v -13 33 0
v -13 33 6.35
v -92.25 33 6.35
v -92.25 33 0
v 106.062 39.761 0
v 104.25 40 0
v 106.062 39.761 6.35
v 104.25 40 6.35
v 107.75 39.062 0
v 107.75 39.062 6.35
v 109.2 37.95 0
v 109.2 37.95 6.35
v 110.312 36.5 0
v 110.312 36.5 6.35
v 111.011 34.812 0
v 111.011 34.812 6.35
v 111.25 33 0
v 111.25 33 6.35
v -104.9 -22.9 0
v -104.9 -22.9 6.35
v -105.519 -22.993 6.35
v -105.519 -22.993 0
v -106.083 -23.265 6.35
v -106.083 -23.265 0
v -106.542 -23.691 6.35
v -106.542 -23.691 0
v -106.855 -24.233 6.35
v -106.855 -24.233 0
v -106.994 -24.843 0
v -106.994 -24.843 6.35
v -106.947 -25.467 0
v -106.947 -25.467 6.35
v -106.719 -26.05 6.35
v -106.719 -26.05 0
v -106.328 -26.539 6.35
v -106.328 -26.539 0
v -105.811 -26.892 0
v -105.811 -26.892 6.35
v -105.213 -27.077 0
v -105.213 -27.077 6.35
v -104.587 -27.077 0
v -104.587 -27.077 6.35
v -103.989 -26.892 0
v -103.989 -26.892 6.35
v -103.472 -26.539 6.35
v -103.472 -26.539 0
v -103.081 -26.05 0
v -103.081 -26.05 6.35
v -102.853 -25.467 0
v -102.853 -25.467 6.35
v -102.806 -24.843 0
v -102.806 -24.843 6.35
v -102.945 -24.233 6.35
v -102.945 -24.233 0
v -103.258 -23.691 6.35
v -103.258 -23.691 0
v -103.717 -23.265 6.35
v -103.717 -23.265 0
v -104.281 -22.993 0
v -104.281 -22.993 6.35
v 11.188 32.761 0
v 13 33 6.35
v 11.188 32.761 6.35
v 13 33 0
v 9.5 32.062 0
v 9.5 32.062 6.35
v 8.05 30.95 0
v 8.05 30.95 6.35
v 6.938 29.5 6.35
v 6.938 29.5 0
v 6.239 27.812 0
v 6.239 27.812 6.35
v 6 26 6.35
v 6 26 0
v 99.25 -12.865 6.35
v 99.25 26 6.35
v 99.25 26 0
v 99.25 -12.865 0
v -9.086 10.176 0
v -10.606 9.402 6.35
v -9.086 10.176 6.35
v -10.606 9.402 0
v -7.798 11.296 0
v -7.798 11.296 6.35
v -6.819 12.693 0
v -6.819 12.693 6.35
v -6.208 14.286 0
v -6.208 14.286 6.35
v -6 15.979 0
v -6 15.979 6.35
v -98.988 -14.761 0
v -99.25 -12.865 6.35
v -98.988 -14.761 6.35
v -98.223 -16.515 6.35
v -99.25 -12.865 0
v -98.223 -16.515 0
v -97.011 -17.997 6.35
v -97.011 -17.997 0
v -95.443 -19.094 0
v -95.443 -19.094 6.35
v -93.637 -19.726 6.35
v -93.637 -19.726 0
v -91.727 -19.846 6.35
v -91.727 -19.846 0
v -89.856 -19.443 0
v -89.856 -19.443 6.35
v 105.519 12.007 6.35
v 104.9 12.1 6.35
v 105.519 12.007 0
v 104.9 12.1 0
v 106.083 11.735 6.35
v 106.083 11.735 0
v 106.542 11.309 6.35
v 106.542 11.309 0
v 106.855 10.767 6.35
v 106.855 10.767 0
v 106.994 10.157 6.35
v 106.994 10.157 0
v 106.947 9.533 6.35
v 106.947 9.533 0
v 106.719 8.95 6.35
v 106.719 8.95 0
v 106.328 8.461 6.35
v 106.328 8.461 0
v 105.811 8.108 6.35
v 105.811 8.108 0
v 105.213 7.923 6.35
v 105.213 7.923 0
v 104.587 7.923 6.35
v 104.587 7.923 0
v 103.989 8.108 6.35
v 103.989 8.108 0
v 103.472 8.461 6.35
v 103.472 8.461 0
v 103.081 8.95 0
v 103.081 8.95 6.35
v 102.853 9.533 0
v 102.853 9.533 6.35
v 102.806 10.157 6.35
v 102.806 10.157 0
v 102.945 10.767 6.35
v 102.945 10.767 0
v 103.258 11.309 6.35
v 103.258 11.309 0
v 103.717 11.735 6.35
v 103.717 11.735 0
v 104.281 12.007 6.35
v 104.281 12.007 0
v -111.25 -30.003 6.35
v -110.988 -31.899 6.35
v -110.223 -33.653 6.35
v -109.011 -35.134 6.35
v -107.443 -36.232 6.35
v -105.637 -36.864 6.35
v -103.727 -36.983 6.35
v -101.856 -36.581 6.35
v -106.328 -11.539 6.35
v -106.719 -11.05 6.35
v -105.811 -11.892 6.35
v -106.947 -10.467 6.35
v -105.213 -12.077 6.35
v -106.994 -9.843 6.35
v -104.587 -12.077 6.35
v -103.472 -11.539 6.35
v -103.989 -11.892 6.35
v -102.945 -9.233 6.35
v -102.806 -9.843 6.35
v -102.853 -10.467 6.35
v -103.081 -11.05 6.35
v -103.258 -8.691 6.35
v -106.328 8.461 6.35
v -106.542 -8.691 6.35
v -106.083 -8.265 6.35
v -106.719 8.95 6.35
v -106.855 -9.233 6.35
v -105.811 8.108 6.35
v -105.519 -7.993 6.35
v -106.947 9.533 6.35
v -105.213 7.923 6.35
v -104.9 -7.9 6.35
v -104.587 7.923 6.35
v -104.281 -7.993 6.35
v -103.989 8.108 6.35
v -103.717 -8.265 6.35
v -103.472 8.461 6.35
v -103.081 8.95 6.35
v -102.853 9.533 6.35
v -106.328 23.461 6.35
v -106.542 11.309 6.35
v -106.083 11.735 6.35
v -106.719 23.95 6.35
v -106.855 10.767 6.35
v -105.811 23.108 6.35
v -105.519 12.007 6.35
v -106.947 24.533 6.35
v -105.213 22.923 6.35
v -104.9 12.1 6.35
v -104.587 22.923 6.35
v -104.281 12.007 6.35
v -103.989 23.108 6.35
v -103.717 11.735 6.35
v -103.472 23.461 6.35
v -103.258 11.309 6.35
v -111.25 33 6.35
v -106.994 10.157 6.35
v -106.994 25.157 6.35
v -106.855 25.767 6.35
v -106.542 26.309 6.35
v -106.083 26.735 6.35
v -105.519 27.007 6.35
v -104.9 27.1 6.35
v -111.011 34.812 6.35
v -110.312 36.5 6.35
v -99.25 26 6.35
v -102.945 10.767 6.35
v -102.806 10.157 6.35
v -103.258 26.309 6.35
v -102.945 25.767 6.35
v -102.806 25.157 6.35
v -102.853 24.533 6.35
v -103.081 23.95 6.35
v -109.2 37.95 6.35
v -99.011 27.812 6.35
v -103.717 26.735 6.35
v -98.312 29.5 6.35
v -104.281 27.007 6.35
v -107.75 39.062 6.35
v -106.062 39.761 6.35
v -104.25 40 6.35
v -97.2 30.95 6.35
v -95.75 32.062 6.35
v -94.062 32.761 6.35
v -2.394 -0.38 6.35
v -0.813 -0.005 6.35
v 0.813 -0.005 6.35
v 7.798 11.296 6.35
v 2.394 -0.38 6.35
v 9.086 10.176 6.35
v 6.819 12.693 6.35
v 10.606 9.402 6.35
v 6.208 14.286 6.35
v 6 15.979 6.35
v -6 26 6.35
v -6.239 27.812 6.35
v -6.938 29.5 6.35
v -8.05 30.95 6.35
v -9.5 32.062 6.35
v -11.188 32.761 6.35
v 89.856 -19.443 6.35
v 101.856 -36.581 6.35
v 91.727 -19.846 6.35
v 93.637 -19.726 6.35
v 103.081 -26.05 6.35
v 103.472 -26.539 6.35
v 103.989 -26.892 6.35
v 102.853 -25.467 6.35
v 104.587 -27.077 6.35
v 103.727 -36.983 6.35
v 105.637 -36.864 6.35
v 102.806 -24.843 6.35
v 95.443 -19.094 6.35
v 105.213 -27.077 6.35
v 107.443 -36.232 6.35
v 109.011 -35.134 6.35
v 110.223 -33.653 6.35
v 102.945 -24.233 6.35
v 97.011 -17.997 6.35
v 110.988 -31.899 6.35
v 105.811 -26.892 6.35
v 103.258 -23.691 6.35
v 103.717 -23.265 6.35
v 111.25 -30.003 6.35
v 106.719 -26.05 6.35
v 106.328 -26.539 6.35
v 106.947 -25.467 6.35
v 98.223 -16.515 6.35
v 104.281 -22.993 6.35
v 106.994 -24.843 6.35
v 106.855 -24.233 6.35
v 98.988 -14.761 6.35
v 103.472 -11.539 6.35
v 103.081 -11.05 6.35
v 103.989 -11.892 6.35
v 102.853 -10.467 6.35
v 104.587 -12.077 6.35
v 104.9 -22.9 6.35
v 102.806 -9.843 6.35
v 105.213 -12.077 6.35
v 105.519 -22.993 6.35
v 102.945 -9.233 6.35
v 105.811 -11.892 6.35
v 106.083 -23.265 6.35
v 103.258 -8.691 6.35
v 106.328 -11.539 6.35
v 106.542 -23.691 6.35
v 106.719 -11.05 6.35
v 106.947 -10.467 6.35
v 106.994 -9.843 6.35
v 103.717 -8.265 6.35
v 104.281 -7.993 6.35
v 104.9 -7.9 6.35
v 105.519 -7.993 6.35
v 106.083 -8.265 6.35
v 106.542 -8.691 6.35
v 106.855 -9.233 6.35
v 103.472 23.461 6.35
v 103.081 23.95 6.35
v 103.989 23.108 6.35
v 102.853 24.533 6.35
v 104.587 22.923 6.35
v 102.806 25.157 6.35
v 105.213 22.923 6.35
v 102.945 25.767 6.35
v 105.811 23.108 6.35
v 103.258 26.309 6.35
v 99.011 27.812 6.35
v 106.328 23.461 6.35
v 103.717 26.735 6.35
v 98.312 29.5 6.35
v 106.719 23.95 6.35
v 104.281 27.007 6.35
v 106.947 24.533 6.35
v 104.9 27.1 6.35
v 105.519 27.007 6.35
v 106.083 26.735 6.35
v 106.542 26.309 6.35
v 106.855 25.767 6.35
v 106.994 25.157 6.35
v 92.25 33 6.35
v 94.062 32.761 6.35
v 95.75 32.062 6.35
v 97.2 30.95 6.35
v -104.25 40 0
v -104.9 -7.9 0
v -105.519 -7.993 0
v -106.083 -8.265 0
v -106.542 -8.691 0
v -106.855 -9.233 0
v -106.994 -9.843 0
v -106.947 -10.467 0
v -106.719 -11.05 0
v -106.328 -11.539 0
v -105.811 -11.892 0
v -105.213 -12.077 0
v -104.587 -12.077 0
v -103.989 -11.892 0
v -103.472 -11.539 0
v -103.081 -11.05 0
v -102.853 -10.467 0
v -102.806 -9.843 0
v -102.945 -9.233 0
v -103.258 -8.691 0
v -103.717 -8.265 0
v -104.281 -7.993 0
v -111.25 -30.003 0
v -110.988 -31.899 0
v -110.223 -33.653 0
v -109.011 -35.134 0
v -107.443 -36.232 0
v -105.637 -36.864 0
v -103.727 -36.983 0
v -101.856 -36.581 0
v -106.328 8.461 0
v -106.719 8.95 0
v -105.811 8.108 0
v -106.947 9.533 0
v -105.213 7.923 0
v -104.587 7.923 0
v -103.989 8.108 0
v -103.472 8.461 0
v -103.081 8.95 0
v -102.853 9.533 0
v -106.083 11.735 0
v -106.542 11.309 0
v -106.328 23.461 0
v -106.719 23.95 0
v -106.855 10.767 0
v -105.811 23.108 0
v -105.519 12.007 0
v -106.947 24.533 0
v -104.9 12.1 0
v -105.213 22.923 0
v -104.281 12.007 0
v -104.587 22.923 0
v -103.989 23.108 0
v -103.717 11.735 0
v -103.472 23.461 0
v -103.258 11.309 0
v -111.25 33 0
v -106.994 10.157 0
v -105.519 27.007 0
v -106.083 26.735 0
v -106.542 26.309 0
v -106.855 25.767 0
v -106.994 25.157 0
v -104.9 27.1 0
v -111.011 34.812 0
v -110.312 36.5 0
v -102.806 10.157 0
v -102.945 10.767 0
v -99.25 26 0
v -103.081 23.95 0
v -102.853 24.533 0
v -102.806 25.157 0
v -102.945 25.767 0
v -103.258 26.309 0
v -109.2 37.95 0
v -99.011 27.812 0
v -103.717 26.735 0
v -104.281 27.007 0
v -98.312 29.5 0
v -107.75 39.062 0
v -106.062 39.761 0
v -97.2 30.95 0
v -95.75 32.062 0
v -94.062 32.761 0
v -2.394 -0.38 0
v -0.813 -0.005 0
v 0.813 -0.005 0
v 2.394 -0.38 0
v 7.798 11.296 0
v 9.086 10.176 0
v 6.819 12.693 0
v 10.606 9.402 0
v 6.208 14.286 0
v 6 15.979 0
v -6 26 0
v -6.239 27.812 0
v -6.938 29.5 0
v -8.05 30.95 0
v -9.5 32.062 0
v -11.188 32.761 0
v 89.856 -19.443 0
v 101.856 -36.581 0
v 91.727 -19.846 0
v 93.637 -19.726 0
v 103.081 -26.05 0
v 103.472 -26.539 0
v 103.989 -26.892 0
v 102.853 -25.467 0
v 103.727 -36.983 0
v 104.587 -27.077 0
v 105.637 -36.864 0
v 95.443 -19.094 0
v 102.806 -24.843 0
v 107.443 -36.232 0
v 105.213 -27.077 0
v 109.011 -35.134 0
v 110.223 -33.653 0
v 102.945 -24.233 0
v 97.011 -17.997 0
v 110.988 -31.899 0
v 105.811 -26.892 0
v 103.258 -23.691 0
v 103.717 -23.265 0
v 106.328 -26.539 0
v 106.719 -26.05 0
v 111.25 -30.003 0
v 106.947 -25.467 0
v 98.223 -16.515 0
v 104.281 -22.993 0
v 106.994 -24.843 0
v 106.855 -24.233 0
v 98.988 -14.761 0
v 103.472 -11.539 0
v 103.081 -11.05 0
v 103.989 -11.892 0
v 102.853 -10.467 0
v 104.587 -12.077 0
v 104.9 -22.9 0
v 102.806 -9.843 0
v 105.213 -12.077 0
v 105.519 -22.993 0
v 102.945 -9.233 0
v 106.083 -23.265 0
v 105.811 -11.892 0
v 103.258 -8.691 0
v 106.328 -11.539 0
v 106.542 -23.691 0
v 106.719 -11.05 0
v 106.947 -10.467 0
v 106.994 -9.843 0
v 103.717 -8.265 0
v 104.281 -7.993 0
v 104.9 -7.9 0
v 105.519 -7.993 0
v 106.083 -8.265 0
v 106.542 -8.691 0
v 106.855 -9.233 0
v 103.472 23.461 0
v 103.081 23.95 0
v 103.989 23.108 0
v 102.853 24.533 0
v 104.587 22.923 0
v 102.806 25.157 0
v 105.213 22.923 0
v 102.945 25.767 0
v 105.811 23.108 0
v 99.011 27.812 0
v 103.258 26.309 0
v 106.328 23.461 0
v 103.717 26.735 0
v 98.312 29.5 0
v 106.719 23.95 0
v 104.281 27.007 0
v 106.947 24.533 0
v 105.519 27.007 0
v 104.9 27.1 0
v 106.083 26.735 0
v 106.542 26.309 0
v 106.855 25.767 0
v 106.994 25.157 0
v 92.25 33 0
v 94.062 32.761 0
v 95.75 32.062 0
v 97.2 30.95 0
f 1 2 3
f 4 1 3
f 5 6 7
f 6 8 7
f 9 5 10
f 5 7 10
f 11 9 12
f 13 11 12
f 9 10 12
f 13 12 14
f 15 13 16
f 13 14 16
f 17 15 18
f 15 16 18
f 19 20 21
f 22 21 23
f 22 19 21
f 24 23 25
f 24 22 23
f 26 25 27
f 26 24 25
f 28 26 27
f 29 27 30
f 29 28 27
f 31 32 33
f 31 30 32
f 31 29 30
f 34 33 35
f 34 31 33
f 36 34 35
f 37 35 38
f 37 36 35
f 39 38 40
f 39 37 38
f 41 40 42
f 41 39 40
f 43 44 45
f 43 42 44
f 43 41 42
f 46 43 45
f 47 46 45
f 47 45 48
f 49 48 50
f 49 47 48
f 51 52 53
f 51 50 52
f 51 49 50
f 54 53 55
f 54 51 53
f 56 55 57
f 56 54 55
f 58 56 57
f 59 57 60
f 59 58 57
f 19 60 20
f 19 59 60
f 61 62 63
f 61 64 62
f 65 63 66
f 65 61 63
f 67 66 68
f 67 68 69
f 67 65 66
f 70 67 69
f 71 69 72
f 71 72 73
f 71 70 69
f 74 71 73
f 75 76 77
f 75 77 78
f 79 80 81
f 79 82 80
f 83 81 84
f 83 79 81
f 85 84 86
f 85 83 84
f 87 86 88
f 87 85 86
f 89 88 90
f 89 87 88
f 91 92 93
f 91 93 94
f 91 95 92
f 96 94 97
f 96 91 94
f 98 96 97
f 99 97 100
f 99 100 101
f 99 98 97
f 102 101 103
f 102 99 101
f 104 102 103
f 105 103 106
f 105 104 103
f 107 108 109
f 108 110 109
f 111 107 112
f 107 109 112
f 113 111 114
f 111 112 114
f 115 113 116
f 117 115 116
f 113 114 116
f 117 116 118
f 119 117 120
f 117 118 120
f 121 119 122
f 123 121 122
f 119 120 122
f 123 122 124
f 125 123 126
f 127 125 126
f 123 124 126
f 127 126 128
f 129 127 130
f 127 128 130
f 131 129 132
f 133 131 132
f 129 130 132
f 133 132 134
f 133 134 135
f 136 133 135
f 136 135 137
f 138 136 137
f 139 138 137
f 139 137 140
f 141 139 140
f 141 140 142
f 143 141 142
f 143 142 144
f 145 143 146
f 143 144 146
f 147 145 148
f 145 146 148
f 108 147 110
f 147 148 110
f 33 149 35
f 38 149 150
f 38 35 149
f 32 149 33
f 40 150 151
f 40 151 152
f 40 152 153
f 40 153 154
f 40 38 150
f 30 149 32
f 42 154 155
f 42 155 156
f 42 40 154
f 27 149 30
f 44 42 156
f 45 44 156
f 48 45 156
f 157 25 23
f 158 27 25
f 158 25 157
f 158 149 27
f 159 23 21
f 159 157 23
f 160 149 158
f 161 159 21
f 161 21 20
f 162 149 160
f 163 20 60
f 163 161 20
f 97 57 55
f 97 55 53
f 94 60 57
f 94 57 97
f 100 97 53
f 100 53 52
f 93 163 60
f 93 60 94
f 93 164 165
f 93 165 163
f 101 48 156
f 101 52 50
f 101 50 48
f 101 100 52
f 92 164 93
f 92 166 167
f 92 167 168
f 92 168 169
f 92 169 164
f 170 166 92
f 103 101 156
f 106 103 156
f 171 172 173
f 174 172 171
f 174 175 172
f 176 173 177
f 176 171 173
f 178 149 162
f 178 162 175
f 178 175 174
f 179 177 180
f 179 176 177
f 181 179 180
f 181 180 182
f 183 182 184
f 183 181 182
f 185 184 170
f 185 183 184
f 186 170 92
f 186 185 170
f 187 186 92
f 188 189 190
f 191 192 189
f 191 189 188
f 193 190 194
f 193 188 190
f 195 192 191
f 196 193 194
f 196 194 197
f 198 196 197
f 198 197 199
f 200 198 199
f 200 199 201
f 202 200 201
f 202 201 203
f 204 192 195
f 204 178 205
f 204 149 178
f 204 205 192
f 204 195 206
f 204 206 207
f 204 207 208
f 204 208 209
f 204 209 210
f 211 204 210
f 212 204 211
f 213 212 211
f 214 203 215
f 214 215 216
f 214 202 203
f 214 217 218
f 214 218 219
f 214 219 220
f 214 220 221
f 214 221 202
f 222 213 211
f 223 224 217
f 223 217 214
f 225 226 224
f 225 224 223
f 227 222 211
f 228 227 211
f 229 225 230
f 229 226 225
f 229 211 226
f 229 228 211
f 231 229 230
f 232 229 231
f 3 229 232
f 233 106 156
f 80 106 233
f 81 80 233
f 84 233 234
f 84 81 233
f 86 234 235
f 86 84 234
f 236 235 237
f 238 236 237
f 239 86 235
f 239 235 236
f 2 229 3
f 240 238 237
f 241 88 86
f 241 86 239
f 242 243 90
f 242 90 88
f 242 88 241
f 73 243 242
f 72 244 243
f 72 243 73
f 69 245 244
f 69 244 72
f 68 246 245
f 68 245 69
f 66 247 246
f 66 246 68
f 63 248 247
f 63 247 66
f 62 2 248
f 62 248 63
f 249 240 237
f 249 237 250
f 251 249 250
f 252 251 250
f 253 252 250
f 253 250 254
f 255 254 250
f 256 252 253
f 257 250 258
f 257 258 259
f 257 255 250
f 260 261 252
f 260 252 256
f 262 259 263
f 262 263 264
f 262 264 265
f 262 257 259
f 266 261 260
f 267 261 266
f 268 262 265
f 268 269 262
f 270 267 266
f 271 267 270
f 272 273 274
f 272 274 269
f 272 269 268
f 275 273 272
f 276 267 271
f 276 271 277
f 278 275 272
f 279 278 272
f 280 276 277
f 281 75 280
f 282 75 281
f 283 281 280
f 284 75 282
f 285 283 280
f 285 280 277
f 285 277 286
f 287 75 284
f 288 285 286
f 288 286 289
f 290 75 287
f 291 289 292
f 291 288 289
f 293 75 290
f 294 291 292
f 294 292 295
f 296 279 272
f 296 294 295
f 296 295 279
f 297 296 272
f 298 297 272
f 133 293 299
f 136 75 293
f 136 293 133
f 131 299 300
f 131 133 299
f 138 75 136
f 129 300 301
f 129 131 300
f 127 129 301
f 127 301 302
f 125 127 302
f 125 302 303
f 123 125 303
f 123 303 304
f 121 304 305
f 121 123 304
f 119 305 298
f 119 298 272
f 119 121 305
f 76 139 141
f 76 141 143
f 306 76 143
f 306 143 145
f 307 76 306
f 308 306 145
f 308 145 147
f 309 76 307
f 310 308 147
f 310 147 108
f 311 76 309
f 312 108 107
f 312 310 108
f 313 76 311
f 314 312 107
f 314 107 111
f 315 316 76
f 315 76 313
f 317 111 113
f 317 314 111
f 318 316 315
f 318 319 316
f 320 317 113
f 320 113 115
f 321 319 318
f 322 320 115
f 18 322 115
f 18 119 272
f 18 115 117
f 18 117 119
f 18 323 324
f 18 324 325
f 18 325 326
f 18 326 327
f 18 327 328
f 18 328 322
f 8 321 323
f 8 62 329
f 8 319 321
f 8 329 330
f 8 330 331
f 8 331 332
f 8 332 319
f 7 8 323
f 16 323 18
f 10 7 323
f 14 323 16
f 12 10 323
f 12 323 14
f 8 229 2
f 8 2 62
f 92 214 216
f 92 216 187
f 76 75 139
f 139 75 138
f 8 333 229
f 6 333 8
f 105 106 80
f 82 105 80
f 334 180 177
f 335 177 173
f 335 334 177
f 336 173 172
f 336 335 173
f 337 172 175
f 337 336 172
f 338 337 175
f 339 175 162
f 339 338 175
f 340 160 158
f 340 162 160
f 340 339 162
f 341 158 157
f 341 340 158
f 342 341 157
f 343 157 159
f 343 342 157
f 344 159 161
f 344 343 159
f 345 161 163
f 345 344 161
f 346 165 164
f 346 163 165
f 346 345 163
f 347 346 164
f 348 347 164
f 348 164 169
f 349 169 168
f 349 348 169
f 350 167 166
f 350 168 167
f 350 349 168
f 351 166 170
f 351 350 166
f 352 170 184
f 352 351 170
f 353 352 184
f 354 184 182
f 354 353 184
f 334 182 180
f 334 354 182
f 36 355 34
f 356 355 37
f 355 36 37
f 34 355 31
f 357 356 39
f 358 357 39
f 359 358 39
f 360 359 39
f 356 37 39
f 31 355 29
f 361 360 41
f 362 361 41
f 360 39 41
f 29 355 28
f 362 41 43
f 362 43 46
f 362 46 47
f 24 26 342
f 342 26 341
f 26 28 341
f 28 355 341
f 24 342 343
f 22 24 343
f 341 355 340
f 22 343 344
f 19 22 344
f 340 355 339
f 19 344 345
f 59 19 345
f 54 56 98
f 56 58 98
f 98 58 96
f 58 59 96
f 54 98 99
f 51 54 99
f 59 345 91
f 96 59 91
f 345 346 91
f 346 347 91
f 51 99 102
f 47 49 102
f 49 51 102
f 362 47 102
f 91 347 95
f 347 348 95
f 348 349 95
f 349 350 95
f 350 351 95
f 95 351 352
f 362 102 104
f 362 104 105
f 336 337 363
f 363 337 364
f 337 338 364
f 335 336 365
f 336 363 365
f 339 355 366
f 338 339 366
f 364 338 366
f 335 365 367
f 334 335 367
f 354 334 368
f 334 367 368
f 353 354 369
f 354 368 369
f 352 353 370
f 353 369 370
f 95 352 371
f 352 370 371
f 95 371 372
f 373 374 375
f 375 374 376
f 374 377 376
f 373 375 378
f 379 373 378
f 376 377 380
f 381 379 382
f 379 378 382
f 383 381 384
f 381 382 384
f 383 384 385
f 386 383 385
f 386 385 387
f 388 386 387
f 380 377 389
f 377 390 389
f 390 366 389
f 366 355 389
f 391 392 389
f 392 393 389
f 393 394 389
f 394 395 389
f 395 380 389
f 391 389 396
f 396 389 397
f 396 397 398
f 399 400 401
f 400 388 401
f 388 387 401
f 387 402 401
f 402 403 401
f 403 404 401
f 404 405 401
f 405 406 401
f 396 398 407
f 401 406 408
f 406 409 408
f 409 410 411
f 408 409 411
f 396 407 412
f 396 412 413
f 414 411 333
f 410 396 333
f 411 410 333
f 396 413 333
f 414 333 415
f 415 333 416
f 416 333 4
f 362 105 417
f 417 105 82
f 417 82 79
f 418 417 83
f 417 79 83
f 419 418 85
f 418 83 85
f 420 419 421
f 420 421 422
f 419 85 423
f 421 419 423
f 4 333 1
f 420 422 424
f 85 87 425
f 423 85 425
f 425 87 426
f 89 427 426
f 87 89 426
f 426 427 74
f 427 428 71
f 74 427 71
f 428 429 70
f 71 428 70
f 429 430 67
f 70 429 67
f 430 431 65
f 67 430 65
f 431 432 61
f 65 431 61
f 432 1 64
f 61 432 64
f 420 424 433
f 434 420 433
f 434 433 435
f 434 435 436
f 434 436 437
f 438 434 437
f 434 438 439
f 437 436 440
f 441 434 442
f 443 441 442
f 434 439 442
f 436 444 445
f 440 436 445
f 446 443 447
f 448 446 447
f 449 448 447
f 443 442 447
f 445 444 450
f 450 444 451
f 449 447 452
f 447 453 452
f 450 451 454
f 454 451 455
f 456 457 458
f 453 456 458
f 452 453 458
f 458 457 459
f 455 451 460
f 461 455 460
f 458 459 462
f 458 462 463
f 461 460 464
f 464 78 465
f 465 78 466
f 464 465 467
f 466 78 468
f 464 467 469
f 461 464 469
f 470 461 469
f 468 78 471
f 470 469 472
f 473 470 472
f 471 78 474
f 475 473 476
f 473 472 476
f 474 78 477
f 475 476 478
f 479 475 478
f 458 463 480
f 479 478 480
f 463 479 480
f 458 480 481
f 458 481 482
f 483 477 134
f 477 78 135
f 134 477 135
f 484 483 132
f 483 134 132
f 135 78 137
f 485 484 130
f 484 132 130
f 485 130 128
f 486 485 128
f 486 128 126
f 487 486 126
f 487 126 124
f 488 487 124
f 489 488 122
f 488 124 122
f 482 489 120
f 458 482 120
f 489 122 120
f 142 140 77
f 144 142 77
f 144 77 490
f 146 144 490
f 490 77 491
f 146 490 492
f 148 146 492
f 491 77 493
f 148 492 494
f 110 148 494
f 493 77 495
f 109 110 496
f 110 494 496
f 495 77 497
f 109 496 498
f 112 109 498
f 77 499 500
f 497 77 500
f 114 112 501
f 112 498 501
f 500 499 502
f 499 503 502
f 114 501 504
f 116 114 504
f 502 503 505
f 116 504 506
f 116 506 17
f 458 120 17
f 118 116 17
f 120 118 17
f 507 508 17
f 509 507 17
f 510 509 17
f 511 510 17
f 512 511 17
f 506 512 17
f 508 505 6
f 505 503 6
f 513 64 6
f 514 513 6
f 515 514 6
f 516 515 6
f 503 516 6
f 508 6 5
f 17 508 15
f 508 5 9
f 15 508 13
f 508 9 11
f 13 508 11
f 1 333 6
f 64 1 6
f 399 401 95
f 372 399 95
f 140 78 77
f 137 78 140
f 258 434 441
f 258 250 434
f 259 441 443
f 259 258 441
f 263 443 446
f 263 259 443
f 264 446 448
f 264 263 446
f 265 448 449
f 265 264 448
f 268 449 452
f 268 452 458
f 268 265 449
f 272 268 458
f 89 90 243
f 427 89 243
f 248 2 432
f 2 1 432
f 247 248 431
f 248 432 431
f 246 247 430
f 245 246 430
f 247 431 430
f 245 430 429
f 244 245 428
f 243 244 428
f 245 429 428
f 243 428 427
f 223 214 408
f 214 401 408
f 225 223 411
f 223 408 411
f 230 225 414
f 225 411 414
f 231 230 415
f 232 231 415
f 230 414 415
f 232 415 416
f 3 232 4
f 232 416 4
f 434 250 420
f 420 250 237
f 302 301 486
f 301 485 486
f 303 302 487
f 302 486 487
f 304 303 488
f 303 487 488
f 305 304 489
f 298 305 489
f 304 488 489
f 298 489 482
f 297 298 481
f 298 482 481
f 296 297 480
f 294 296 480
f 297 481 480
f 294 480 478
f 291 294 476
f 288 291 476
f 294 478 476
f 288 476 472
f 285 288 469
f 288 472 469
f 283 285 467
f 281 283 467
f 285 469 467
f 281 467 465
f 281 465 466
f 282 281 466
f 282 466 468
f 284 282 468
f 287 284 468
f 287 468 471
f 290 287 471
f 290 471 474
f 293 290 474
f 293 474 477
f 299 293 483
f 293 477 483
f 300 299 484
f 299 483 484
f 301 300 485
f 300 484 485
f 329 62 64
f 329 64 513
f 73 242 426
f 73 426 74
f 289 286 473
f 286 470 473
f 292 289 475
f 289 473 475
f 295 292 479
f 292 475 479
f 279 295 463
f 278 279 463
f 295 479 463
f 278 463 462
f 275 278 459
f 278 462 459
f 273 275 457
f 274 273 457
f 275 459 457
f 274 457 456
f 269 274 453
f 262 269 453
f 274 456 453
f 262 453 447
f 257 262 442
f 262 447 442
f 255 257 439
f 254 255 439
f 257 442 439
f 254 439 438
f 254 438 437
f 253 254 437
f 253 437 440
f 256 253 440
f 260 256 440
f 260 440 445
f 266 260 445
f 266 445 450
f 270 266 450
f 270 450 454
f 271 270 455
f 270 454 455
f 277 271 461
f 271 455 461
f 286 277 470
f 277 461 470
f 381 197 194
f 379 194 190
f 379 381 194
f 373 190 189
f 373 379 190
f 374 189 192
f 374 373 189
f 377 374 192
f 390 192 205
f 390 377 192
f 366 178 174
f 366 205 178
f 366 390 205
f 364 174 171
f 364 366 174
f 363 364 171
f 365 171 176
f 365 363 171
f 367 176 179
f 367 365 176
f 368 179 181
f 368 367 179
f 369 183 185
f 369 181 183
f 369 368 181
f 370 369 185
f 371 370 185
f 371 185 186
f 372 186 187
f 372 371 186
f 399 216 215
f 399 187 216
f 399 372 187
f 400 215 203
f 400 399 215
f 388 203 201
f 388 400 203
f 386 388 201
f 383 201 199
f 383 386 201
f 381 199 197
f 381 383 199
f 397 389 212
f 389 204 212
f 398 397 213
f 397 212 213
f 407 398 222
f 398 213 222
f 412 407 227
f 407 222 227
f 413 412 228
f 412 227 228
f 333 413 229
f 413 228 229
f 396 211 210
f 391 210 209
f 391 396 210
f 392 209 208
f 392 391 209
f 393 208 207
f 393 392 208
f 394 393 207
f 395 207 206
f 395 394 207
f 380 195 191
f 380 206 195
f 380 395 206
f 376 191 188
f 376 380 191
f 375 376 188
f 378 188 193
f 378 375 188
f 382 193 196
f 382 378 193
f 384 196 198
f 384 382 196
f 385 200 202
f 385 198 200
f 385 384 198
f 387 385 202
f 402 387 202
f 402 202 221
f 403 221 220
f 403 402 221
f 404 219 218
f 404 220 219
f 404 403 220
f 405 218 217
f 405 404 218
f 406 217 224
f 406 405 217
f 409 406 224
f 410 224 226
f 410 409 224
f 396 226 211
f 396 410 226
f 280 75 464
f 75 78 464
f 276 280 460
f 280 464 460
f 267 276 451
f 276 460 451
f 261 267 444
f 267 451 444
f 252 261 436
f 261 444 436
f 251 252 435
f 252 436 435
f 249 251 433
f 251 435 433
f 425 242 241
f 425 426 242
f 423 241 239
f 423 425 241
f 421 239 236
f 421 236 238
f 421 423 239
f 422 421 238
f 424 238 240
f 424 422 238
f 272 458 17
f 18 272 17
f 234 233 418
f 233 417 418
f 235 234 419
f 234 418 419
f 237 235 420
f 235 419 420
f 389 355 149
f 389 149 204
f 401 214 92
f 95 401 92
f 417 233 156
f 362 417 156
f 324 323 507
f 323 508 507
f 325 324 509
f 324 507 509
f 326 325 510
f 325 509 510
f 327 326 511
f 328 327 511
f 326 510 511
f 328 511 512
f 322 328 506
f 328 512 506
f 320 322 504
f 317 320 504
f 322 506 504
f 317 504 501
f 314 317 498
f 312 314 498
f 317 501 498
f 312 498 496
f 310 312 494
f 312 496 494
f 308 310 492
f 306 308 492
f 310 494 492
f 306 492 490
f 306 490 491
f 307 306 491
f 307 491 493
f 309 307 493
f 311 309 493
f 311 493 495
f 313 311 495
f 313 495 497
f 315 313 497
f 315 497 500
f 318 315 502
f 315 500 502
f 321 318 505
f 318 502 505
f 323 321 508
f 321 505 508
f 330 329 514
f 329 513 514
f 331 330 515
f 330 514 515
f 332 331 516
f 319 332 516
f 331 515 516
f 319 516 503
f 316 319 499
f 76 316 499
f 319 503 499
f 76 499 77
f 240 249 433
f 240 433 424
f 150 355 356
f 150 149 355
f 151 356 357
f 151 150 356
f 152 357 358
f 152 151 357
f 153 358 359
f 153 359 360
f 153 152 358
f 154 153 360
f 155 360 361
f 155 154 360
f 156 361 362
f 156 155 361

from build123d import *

# Parameters (mm, degrees)
SKETCH1_W                      = 222.5
SKETCH1_H                      = 80
BOSS_EXTRUDE1_DEPTH            = 6.35
CUT_EXTRUDE1_DEPTH             = 119.392926309
CUT_EXTRUDE2_DEPTH             = 119.392926309
M5X0_8_TAPPED_HOLE1_AT_2_COUNT = 2
M5X0_8_TAPPED_HOLE1_AT_2_PITCH = 15
M5X0_8_TAPPED_HOLE1_AT_3_COUNT = 2
M5X0_8_TAPPED_HOLE1_AT_3_PITCH = 50
M5X0_8_TAPPED_HOLE1_AT_4_COUNT = 2
M5X0_8_TAPPED_HOLE1_AT_4_PITCH = 35
FILLET1_R                      = 7


with BuildPart() as part:
    # Sketch1 → Boss-Extrude1 (new body)
    with BuildSketch(Plane.XY):
        Rectangle(SKETCH1_W, SKETCH1_H)
    extrude(amount=BOSS_EXTRUDE1_DEPTH)

    # Sketch2 → Cut-Extrude1 (cut, through all)
    with BuildSketch(Plane.XY.offset(6.35)):
        Polygon((111.25, -40), (0, 0.491688562), (-111.25, -40), align=None)
    extrude(amount=-CUT_EXTRUDE1_DEPTH, mode=Mode.SUBTRACT)

    # Sketch3 → Cut-Extrude2 (cut, through all)
    with BuildSketch(Plane.XY.offset(6.35)):
        Polygon((-99.25, 33), (-99.25, -22.862223919), (-6, 11.078000426), (-6, 33), align=None)
    cut_extrude2 = extrude(amount=-CUT_EXTRUDE2_DEPTH, mode=Mode.SUBTRACT)

    # Sketch4 → M5x0.8 Tapped Hole1 (revolve, cut)
    with BuildSketch(Plane(origin=(-104.9, -25, 0), x_dir=(0, 1, 0), z_dir=(1, 0, 0))):
        Polygon((0, 0), (0, 13.6618073), (2.1, 12.4), (2.1, 0), align=None)
    m5x0_8_tapped_hole1 = revolve(axis=Axis((-104.9, -25, -6.35), (0, 0, 1)), mode=Mode.SUBTRACT)

    # M5x0.8 Tapped Hole1 at 2: M5x0.8 Tapped Hole1 ×2
    with Locations(*[(0, i * M5X0_8_TAPPED_HOLE1_AT_2_PITCH, 0) for i in range(1, M5X0_8_TAPPED_HOLE1_AT_2_COUNT)]):
        add(m5x0_8_tapped_hole1, mode=Mode.SUBTRACT)

    # M5x0.8 Tapped Hole1 at 3: M5x0.8 Tapped Hole1 ×2
    with Locations(*[(0, i * M5X0_8_TAPPED_HOLE1_AT_3_PITCH, 0) for i in range(1, M5X0_8_TAPPED_HOLE1_AT_3_COUNT)]):
        add(m5x0_8_tapped_hole1, mode=Mode.SUBTRACT)

    # M5x0.8 Tapped Hole1 at 4: M5x0.8 Tapped Hole1 ×2
    with Locations(*[(0, i * M5X0_8_TAPPED_HOLE1_AT_4_PITCH, 0) for i in range(1, M5X0_8_TAPPED_HOLE1_AT_4_COUNT)]):
        add(m5x0_8_tapped_hole1, mode=Mode.SUBTRACT)

    # Mirror1: Cut-Extrude2, M5x0.8 Tapped Hole1 across plane
    add(cut_extrude2.mirror(Plane(origin=(0, 0, 0), x_dir=(0, 0, 1), z_dir=(1, 0, 0))), mode=Mode.SUBTRACT)
    add(m5x0_8_tapped_hole1.mirror(Plane(origin=(0, 0, 0), x_dir=(0, 0, 1), z_dir=(1, 0, 0))), mode=Mode.SUBTRACT)

    # Mirror1 copy 1 sketch → Mirror1 copy 1 (revolve, cut)
    with BuildSketch(Plane(origin=(104.9, -10, 0), x_dir=(0, 1, 0), z_dir=(-1, 0, 0))):
        Polygon((0, 0), (0, -13.6618073), (2.1, -12.4), (2.1, 0), align=None)
    revolve(axis=Axis((104.9, -10, -6.35), (0, 0, -1)), mode=Mode.SUBTRACT)

    # Mirror1 copy 2 sketch → Mirror1 copy 2 (revolve, cut)
    with BuildSketch(Plane(origin=(104.9, 25, 0), x_dir=(0, 1, 0), z_dir=(-1, 0, 0))):
        Polygon((0, 0), (0, -13.6618073), (2.1, -12.4), (2.1, 0), align=None)
    revolve(axis=Axis((104.9, 25, -6.35), (0, 0, -1)), mode=Mode.SUBTRACT)

    # Mirror1 copy 3 sketch → Mirror1 copy 3 (revolve, cut)
    with BuildSketch(Plane(origin=(104.9, 10, 0), x_dir=(0, 1, 0), z_dir=(-1, 0, 0))):
        Polygon((0, 0), (0, -13.6618073), (2.1, -12.4), (2.1, 0), align=None)
    revolve(axis=Axis((104.9, 10, -6.35), (0, 0, -1)), mode=Mode.SUBTRACT)

    # Fillet1
    fillet1_edges = [part.edges().sort_by_distance(p)[0] for p in [
        (0, 0.491688562, 3.175),
        (-99.25, 33, 3.175),
        (-6, 33, 3.175),
        (-6, 11.078000426, 3.175),
        (-99.25, -22.862223919, 3.175),
        (6, 33, 3.175),
        (99.25, 33, 3.175),
        (99.25, -22.862223919, 3.175),
        (6, 11.078000426, 3.175),
        (111.25, -40, 3.175),
        (-111.25, -40, 3.175),
        (-111.25, 40, 3.175),
        (111.25, 40, 3.175),
    ]]
    fillet(fillet1_edges, radius=FILLET1_R)


solid = part.part
